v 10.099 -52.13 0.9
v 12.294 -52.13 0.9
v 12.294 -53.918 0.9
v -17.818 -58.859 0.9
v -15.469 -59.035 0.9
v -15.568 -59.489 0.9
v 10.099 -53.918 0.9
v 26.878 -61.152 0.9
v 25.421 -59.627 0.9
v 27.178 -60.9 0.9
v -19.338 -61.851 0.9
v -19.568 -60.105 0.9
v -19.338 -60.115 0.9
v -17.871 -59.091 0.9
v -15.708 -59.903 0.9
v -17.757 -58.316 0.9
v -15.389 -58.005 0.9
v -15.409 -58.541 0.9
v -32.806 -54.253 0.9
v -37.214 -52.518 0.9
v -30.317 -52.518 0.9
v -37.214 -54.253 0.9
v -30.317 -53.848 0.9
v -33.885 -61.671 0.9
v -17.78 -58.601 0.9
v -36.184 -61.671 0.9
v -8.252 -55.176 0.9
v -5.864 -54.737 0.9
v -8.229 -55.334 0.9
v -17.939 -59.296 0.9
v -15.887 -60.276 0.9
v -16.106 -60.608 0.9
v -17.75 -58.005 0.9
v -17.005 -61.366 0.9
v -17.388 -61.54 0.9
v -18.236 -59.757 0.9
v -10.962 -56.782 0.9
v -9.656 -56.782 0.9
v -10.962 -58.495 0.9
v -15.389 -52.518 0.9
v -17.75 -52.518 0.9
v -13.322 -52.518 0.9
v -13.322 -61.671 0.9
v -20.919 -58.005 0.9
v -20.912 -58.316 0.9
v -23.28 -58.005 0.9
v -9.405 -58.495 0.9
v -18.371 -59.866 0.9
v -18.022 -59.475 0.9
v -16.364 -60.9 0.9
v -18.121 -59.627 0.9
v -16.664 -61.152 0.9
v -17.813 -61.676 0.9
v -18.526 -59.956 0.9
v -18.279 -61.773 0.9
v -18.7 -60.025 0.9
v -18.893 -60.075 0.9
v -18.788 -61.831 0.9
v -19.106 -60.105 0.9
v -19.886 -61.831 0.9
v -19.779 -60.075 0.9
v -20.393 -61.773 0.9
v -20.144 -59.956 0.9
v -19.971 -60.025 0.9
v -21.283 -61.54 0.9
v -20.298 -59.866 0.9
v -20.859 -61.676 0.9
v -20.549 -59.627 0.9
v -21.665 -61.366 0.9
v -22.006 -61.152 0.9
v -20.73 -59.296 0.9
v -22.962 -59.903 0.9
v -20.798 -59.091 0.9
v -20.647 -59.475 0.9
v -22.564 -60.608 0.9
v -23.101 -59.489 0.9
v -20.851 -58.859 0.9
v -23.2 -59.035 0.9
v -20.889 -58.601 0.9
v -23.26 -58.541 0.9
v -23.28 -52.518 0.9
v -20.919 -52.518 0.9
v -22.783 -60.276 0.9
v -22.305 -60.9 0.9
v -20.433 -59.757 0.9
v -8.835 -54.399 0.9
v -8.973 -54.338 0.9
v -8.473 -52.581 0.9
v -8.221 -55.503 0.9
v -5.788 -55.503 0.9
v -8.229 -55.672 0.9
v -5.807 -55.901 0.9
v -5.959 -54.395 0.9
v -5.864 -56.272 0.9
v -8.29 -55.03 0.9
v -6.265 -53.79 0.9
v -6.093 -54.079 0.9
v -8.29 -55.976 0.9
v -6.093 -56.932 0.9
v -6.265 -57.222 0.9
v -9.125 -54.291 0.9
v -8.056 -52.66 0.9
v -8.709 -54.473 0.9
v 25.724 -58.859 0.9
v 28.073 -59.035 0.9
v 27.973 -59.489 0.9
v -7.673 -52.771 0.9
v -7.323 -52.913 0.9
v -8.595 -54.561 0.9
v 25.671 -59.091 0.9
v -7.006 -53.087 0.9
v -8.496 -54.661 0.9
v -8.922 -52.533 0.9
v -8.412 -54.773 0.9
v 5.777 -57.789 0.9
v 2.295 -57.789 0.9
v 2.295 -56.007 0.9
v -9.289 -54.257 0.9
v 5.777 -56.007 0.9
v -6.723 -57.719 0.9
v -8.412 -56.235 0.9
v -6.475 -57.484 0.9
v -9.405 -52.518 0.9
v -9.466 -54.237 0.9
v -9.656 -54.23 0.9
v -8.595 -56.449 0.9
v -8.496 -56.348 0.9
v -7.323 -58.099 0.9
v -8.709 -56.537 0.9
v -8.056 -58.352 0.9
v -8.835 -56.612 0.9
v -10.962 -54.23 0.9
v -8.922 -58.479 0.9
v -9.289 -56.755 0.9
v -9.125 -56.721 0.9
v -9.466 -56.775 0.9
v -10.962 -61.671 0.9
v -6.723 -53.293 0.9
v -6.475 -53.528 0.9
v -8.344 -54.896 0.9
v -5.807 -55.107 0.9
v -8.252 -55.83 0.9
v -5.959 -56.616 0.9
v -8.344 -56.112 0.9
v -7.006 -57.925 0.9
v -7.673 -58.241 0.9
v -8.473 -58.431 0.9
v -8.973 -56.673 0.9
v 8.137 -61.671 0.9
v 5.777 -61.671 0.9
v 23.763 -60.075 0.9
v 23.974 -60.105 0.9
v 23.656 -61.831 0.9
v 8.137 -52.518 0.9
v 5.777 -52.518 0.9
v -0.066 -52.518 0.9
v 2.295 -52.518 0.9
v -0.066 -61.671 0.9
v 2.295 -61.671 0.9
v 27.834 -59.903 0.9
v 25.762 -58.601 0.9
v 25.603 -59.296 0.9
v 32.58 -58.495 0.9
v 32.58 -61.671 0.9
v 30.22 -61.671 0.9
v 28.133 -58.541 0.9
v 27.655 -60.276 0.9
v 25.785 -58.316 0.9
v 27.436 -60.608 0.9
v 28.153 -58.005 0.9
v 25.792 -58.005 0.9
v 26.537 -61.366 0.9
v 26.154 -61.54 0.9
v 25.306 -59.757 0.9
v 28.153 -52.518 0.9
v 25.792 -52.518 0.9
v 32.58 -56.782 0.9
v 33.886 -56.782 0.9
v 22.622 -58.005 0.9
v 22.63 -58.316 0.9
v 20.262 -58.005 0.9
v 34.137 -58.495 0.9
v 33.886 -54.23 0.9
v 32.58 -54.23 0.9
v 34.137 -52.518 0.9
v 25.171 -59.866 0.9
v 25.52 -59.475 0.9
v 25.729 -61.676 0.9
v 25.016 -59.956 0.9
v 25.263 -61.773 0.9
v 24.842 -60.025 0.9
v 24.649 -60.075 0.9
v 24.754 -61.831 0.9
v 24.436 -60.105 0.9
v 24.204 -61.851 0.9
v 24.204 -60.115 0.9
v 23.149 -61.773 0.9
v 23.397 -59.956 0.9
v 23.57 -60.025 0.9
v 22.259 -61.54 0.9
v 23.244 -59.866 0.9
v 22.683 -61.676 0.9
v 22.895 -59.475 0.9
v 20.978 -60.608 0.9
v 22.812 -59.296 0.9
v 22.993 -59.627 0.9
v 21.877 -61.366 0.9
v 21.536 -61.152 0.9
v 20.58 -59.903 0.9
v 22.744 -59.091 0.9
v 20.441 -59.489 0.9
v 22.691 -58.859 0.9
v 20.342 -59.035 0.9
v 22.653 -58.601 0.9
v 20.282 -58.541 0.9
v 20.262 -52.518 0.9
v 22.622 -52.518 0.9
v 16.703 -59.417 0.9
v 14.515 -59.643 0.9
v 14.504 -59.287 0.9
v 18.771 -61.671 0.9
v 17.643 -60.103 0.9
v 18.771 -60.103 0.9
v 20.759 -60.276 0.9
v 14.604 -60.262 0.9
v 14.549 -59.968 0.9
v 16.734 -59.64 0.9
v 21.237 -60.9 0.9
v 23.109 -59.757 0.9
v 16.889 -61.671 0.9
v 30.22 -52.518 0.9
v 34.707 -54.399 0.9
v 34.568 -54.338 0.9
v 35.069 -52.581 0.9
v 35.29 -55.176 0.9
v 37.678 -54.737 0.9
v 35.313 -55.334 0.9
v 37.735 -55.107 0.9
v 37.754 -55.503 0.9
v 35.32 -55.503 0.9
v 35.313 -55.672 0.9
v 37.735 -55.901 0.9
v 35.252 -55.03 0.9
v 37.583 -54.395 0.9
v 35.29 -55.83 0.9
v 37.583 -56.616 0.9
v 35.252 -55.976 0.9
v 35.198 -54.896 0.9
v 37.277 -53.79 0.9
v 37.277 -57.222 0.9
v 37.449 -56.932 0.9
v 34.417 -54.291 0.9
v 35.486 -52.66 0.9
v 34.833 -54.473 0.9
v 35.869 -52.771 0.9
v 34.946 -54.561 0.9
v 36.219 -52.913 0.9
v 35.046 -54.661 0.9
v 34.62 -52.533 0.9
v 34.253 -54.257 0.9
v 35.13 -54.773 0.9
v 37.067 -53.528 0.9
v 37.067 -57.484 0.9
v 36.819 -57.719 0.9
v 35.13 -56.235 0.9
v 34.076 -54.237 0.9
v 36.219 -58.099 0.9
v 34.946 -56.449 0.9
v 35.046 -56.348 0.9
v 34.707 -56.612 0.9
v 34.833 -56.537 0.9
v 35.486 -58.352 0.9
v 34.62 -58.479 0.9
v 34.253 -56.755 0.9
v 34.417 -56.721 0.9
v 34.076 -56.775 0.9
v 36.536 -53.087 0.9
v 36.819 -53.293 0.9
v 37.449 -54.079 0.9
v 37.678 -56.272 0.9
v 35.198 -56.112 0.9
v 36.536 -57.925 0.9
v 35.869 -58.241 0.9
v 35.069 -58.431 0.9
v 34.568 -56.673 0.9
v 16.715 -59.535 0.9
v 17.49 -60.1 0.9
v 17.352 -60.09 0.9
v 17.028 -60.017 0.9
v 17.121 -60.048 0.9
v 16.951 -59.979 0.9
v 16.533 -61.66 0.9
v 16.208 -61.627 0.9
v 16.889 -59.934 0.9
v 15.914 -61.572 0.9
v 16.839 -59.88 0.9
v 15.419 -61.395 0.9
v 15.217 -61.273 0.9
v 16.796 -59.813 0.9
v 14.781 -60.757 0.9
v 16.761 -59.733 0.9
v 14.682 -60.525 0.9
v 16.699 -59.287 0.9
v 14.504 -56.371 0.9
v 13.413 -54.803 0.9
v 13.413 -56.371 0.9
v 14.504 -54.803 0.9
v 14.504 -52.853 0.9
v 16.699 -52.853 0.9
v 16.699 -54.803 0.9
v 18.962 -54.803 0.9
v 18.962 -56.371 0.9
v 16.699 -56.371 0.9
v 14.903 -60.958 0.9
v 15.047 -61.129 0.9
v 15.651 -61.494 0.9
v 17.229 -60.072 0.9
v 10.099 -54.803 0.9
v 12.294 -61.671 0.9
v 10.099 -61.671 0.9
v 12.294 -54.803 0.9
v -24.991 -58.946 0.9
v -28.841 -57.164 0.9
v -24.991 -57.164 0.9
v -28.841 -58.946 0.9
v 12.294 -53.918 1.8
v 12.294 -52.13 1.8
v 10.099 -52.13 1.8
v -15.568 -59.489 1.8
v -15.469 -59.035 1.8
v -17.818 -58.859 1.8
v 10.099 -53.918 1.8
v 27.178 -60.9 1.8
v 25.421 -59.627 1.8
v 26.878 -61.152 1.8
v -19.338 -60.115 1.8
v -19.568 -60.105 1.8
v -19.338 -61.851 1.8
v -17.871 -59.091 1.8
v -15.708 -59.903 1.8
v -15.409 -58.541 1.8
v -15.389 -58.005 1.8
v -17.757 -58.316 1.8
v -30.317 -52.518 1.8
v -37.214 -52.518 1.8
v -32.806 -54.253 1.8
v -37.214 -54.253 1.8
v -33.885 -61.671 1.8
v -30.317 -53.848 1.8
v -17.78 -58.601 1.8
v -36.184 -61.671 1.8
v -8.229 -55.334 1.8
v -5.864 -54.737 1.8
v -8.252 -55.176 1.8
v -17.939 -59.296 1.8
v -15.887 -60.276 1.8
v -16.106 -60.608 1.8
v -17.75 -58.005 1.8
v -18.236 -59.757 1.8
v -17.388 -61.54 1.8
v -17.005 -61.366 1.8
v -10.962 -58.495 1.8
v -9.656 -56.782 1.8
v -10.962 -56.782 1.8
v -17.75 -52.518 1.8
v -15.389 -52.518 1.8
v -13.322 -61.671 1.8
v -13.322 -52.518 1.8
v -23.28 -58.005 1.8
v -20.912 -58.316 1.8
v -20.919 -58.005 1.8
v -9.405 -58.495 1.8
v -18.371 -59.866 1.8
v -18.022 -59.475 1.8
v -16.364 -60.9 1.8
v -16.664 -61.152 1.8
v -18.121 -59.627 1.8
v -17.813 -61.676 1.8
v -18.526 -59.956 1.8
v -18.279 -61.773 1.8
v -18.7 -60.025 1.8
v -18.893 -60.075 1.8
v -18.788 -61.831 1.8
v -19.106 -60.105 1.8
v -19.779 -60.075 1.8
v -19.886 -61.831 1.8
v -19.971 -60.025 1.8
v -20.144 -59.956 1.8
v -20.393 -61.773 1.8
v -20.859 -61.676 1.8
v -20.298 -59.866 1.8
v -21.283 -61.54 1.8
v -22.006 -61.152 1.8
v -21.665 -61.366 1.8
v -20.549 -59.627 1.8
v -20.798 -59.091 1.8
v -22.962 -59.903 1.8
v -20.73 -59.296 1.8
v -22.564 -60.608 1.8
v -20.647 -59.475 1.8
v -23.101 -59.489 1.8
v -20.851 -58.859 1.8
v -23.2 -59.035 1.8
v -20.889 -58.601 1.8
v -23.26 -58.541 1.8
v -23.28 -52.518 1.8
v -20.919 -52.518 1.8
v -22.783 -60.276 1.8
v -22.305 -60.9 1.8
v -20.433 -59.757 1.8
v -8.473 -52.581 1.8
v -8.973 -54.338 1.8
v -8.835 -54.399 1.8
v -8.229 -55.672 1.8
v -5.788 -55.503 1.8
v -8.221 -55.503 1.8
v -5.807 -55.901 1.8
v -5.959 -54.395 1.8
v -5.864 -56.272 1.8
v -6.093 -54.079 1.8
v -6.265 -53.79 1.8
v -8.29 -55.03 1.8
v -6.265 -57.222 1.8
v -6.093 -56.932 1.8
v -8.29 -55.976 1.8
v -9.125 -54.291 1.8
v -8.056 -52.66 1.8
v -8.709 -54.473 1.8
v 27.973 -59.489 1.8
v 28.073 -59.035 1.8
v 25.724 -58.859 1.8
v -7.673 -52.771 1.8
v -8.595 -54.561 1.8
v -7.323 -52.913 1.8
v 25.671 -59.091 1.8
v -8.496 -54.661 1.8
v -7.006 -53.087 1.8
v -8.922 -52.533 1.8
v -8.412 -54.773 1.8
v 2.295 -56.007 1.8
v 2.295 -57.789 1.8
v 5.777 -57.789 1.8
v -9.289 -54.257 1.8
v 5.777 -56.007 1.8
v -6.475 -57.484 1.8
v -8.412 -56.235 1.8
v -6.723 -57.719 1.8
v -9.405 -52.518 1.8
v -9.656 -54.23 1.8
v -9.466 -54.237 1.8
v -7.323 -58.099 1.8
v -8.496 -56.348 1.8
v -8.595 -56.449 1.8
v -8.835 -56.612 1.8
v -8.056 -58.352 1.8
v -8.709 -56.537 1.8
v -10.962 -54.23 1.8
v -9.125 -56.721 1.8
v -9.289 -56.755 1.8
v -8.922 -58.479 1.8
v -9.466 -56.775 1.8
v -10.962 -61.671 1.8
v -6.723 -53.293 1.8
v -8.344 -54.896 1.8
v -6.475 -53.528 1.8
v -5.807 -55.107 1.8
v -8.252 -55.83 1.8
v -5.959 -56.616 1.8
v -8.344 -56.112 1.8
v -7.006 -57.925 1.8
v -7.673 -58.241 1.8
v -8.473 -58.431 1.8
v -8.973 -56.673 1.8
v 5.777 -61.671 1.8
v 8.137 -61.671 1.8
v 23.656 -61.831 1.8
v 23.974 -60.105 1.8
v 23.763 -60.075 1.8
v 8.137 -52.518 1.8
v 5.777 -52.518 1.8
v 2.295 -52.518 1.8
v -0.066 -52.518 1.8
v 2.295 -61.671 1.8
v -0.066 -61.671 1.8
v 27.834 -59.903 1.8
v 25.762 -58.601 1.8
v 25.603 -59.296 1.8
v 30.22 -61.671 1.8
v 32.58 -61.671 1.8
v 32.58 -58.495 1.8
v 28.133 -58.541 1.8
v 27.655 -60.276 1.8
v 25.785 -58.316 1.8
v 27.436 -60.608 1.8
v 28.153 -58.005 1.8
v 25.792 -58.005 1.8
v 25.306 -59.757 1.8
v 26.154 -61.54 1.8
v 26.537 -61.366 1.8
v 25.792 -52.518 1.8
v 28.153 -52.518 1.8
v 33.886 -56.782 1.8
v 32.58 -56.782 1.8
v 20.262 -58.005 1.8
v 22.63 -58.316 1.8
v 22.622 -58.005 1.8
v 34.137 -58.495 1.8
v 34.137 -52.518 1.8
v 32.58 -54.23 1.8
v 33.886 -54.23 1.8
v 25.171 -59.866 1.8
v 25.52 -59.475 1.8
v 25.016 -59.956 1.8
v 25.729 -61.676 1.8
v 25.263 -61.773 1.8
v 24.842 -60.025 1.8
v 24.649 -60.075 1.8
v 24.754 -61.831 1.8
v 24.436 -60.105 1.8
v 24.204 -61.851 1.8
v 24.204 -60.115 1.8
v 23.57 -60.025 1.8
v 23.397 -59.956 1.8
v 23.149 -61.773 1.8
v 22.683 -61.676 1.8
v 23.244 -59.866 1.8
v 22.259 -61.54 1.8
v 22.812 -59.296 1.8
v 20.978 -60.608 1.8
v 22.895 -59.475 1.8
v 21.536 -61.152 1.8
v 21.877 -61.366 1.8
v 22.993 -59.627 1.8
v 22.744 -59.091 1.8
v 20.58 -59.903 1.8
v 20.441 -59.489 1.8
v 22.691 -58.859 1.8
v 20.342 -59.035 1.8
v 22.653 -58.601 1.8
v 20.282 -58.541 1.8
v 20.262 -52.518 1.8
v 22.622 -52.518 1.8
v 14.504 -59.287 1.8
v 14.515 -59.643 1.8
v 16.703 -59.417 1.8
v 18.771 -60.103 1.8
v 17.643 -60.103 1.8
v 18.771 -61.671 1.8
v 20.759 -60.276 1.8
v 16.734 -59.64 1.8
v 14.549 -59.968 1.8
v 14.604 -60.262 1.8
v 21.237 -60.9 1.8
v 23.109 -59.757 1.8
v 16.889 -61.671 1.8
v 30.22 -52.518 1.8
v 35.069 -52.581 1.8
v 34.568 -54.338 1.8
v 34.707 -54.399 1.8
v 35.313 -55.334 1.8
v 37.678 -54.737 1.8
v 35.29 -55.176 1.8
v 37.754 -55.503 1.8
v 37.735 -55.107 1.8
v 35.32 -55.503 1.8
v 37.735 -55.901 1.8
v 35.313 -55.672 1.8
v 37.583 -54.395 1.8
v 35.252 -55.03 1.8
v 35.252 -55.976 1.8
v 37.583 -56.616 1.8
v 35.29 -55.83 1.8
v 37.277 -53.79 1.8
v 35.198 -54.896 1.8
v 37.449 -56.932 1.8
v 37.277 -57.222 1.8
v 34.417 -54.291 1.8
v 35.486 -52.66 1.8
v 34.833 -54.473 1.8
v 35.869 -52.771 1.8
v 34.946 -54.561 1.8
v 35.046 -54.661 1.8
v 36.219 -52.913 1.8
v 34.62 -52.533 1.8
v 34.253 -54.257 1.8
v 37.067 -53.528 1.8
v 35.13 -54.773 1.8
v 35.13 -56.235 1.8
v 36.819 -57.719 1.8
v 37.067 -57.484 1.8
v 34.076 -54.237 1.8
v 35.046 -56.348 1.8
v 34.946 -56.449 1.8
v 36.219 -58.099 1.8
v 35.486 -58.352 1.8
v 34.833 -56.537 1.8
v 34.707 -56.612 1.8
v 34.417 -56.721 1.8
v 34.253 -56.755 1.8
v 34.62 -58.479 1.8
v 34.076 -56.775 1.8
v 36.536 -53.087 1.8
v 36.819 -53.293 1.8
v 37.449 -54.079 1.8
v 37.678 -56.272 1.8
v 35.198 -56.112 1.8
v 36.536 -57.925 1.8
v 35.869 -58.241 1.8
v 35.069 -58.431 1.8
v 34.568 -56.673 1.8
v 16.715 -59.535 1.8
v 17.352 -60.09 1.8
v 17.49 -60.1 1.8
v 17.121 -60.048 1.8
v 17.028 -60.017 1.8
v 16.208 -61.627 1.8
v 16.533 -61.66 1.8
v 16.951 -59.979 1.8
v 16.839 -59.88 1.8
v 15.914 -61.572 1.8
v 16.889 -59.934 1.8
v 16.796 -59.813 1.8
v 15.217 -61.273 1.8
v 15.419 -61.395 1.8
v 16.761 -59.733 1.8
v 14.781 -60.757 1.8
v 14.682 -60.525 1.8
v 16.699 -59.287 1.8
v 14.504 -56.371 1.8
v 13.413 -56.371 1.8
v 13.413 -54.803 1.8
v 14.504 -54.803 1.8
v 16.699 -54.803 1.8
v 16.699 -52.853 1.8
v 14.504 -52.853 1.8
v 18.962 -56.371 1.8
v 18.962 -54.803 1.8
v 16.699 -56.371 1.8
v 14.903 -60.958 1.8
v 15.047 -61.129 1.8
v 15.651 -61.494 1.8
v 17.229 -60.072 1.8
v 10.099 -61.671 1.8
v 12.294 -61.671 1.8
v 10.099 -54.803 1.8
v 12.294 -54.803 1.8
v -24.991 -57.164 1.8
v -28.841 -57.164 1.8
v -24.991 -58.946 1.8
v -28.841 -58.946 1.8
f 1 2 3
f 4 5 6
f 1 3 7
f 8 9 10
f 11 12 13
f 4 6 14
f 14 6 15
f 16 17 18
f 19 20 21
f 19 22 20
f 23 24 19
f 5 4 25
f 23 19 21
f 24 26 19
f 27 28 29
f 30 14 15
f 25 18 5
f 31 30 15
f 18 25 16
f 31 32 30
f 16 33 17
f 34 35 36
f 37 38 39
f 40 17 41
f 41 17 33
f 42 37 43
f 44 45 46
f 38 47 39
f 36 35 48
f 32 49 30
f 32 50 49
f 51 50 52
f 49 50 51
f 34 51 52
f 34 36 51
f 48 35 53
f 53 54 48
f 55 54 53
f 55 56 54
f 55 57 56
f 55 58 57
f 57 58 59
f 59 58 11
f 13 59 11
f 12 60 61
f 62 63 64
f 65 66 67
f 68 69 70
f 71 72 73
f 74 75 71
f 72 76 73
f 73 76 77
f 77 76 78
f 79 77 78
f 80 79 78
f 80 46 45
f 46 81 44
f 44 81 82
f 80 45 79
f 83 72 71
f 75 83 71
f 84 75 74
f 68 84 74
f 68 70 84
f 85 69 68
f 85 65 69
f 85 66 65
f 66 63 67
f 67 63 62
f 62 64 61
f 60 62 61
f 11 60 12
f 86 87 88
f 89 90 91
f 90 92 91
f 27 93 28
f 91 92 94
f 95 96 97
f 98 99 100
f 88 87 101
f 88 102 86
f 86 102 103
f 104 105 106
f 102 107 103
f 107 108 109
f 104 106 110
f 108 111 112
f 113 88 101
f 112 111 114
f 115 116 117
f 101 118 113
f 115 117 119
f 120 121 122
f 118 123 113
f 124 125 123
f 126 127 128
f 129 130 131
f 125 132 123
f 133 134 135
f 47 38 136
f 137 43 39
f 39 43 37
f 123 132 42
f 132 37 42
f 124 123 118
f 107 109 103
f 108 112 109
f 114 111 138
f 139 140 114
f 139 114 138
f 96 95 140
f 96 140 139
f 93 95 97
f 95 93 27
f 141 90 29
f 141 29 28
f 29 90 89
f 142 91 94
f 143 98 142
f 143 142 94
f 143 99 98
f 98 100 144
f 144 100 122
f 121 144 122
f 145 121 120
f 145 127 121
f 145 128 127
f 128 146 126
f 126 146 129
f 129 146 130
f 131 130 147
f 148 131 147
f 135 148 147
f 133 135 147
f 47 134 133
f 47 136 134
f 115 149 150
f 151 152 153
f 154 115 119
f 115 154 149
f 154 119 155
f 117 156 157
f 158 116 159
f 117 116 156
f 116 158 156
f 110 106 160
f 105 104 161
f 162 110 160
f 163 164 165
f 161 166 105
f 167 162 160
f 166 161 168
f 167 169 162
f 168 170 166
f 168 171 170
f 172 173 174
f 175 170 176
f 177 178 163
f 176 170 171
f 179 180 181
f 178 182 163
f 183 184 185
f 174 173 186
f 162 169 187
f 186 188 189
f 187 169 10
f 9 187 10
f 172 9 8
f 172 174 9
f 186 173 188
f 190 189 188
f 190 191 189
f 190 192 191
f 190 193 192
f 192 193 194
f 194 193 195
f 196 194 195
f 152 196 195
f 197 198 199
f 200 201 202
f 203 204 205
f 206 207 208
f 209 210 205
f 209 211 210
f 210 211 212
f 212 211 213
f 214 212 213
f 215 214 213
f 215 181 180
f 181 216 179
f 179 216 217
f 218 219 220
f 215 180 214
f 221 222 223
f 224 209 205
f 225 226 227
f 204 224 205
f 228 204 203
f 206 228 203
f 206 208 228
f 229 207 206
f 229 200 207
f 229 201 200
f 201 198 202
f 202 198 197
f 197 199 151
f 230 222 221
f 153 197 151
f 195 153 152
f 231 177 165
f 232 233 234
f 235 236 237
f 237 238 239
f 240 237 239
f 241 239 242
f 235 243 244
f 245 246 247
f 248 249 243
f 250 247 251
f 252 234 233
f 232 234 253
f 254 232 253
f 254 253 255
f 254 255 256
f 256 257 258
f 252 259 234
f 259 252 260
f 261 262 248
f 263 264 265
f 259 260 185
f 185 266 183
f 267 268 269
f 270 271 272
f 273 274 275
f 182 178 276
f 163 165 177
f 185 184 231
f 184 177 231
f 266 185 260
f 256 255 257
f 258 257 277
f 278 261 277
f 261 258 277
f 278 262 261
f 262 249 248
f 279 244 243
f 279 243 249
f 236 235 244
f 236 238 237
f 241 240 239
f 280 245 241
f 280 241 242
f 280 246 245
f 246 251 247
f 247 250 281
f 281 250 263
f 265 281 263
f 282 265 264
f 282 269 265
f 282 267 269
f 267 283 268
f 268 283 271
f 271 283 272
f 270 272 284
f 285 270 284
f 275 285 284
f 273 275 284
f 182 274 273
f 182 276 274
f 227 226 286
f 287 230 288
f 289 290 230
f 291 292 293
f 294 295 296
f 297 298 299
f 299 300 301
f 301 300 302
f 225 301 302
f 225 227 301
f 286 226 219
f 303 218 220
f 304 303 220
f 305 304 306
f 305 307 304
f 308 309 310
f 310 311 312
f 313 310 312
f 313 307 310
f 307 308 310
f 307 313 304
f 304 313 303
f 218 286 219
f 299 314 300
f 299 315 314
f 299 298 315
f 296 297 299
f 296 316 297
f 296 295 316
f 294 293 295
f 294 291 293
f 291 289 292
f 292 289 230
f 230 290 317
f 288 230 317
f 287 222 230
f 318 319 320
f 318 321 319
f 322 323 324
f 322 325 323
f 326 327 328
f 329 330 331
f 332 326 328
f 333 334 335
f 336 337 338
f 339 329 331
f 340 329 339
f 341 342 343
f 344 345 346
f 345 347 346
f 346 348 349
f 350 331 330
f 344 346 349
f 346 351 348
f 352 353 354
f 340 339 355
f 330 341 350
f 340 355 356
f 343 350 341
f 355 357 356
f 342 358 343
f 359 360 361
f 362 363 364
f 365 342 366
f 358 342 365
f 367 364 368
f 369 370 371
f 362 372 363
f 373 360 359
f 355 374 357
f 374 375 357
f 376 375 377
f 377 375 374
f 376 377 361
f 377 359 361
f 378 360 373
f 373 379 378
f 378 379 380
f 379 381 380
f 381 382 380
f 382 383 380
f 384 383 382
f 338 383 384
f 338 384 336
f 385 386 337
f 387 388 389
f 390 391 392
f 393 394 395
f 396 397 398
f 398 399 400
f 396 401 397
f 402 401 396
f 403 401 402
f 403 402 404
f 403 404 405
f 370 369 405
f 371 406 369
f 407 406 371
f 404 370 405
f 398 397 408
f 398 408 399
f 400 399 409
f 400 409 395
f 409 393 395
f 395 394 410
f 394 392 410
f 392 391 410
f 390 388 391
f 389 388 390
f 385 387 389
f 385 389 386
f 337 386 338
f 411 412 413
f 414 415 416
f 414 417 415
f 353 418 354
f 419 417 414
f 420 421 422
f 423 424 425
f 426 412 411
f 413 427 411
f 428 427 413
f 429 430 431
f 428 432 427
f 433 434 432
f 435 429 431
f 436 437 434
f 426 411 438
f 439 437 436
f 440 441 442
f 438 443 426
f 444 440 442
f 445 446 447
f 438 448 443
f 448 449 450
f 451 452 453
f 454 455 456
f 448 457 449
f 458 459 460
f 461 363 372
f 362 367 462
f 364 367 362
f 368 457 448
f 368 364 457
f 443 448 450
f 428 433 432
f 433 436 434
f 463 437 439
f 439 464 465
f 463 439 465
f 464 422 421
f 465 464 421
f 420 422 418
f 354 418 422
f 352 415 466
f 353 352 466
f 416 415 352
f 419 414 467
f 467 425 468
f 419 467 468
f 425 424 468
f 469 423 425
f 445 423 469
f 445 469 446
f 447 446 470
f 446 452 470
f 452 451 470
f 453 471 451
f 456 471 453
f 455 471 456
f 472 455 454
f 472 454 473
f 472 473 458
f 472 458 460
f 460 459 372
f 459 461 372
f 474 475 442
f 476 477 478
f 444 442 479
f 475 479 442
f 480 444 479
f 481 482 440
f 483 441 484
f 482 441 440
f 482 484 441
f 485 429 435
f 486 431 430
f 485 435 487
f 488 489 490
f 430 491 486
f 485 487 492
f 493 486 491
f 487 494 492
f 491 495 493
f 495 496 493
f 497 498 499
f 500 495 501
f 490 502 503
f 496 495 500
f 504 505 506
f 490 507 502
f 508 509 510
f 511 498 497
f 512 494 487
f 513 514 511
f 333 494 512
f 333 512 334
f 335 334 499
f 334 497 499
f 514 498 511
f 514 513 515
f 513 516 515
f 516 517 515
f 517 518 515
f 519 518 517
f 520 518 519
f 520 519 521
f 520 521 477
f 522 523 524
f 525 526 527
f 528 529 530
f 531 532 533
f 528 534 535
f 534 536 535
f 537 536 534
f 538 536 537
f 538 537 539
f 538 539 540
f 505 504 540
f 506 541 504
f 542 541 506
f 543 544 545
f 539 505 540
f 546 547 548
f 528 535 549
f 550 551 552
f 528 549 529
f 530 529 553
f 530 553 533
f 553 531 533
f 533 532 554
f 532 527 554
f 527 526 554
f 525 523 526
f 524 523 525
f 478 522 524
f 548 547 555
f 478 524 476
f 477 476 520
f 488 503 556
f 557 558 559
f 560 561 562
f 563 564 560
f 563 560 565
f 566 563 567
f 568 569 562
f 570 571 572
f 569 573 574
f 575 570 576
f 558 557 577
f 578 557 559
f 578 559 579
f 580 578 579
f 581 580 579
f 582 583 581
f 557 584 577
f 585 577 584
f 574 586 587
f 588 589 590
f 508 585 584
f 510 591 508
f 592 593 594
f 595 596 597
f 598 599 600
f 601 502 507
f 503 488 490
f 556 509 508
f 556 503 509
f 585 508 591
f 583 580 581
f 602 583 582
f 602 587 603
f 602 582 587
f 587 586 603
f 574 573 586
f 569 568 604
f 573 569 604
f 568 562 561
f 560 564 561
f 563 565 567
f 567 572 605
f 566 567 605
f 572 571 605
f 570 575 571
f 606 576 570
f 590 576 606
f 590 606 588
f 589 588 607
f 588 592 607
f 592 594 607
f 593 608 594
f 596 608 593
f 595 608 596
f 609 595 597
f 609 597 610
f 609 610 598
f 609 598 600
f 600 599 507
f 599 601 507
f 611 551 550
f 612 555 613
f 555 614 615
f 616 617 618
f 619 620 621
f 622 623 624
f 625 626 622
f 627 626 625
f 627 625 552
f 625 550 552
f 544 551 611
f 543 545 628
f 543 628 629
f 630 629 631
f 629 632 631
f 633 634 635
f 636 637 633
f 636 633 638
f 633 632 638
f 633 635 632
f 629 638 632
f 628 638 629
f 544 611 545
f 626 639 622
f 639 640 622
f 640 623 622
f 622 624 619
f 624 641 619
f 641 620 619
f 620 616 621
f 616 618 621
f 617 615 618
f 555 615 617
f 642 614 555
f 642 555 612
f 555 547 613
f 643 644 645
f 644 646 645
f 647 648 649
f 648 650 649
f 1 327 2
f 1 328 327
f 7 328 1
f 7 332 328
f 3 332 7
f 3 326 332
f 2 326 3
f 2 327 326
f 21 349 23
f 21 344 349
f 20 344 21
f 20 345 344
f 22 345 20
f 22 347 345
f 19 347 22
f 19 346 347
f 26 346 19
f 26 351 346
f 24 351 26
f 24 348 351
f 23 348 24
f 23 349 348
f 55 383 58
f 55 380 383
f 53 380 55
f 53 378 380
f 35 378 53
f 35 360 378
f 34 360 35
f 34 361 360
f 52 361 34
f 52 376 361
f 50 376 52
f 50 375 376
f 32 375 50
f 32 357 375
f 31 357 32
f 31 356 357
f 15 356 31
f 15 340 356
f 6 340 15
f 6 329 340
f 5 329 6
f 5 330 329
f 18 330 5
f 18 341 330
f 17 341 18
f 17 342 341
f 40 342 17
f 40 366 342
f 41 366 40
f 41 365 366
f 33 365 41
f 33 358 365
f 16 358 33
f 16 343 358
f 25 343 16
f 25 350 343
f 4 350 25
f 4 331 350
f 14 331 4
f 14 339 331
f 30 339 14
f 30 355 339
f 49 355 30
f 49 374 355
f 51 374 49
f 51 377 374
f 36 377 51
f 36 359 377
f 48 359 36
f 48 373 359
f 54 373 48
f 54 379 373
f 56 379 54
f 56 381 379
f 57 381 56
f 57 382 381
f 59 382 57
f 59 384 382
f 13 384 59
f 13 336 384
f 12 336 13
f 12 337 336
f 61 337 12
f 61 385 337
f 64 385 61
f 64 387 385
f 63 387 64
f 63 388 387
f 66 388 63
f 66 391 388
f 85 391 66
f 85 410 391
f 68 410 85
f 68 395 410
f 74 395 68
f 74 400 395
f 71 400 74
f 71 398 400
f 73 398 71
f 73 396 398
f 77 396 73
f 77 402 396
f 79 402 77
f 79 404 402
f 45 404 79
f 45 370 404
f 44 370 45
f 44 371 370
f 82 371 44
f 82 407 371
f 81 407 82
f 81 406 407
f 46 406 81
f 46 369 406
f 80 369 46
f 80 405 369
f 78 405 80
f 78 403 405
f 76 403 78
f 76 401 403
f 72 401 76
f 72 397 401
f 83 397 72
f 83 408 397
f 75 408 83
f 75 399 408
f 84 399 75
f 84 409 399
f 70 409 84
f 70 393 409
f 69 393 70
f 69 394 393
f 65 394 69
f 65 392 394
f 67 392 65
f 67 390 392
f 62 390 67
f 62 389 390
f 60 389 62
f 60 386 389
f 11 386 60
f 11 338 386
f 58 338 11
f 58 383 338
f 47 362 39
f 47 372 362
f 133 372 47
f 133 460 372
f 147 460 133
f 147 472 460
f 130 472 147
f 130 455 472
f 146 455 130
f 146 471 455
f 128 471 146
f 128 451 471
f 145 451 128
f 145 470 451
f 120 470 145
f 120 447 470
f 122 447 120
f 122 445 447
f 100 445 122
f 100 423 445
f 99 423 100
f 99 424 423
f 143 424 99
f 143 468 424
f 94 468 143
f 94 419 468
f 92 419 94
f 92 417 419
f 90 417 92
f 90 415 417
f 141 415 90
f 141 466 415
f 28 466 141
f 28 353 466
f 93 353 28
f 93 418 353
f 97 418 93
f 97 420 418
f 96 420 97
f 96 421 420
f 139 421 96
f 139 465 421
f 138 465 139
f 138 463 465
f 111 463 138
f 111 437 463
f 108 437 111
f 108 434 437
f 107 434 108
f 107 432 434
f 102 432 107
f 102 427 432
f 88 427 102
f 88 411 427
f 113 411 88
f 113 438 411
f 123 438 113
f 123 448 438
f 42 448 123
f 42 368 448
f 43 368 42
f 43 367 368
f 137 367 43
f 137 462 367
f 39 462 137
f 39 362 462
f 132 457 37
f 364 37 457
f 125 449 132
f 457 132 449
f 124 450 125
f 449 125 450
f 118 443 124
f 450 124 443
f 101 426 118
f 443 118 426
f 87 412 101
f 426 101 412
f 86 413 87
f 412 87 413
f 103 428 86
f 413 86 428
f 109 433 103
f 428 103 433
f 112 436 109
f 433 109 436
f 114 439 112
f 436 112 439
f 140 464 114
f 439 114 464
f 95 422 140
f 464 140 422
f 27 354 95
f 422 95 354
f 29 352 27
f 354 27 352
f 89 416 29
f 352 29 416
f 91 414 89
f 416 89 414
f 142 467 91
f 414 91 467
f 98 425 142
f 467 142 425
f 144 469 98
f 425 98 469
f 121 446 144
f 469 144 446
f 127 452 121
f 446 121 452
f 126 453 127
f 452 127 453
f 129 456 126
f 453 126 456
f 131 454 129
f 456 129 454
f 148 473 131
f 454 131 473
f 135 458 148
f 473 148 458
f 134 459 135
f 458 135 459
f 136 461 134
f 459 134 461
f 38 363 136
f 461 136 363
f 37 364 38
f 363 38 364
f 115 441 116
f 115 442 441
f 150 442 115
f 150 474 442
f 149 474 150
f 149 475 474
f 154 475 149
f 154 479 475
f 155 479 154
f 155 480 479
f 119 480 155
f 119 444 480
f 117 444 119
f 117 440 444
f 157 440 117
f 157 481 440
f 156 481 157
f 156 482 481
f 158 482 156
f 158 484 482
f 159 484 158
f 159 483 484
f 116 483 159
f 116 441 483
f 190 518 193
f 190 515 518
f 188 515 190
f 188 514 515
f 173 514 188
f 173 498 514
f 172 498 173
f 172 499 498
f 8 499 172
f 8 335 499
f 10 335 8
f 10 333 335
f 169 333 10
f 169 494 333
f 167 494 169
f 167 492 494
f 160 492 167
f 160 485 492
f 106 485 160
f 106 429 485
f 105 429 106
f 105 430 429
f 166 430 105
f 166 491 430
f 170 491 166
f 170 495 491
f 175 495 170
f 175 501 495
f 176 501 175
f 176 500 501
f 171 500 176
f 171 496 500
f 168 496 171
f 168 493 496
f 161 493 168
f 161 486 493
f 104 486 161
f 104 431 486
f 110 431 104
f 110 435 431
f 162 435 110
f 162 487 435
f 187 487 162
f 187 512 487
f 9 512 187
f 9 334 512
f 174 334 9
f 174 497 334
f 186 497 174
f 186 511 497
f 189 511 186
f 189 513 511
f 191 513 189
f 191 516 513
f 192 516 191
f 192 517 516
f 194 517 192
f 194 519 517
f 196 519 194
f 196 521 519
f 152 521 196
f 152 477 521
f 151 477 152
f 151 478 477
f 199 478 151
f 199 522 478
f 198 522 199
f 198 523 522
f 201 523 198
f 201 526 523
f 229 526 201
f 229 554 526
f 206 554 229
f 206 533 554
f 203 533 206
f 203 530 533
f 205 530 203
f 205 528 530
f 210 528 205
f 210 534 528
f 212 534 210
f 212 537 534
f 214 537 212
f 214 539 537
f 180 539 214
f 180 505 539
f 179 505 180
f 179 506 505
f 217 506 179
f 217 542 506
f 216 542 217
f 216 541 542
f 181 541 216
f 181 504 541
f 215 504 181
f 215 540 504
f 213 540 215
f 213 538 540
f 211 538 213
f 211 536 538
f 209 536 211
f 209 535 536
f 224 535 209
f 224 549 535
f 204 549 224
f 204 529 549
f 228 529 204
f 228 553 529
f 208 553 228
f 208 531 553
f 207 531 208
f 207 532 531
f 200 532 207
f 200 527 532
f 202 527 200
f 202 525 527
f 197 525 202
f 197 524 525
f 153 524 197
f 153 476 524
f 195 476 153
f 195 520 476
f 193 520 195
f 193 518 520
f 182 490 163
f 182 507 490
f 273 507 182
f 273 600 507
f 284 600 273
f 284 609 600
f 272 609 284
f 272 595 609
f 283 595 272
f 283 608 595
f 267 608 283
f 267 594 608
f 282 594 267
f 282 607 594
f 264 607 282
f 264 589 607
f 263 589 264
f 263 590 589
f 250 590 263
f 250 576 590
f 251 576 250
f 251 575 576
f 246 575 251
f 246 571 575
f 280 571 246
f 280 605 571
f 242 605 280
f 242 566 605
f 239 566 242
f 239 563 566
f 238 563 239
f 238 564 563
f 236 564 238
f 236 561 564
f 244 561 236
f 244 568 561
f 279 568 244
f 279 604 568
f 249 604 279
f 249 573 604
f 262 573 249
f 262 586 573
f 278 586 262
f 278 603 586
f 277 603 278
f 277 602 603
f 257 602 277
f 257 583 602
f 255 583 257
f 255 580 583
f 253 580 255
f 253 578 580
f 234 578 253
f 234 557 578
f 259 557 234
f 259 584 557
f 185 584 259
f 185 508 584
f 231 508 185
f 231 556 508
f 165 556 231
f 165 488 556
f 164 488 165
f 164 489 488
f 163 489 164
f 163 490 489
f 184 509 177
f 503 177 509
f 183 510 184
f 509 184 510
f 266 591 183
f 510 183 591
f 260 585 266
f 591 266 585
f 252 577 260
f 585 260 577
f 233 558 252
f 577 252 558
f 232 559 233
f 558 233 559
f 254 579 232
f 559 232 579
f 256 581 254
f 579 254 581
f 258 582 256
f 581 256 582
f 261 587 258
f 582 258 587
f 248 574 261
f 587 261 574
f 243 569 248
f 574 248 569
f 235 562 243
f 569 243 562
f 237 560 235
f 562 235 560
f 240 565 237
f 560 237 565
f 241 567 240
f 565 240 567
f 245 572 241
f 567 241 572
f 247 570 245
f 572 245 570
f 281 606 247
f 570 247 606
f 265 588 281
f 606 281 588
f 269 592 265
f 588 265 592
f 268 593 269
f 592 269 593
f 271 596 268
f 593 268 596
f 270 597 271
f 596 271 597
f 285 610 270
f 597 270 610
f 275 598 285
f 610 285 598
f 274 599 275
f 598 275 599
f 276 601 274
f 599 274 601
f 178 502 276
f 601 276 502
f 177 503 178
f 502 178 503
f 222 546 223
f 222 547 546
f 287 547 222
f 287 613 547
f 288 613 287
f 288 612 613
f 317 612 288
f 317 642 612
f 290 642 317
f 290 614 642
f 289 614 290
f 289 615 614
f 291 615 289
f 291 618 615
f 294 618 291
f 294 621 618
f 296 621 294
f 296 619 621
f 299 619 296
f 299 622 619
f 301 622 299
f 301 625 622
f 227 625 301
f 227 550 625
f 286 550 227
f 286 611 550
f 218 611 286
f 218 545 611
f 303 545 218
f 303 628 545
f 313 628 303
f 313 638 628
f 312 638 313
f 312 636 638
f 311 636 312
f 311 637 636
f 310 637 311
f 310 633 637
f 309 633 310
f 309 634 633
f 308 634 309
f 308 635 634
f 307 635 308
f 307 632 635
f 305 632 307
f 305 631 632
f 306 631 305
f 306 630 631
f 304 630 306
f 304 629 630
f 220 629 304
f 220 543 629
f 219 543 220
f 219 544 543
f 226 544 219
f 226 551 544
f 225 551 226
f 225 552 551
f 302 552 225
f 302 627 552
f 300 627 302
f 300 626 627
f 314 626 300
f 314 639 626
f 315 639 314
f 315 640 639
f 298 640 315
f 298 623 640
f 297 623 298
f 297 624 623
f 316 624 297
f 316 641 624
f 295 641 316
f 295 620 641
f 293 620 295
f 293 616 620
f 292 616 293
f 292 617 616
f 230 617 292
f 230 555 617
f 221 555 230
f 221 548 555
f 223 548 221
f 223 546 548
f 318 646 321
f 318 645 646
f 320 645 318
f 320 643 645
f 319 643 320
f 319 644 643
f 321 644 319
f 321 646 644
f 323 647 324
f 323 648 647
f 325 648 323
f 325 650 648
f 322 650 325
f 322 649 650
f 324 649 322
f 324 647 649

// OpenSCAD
$fn = 48;
  // English (below bottom hole)
  translate([0, -57.100, 0.900]) linear_extrude(height=0.900) text("7-UP HitUP", size=9.041, halign="center", valign="center", font="Helvetica Neue:style=Bold");
